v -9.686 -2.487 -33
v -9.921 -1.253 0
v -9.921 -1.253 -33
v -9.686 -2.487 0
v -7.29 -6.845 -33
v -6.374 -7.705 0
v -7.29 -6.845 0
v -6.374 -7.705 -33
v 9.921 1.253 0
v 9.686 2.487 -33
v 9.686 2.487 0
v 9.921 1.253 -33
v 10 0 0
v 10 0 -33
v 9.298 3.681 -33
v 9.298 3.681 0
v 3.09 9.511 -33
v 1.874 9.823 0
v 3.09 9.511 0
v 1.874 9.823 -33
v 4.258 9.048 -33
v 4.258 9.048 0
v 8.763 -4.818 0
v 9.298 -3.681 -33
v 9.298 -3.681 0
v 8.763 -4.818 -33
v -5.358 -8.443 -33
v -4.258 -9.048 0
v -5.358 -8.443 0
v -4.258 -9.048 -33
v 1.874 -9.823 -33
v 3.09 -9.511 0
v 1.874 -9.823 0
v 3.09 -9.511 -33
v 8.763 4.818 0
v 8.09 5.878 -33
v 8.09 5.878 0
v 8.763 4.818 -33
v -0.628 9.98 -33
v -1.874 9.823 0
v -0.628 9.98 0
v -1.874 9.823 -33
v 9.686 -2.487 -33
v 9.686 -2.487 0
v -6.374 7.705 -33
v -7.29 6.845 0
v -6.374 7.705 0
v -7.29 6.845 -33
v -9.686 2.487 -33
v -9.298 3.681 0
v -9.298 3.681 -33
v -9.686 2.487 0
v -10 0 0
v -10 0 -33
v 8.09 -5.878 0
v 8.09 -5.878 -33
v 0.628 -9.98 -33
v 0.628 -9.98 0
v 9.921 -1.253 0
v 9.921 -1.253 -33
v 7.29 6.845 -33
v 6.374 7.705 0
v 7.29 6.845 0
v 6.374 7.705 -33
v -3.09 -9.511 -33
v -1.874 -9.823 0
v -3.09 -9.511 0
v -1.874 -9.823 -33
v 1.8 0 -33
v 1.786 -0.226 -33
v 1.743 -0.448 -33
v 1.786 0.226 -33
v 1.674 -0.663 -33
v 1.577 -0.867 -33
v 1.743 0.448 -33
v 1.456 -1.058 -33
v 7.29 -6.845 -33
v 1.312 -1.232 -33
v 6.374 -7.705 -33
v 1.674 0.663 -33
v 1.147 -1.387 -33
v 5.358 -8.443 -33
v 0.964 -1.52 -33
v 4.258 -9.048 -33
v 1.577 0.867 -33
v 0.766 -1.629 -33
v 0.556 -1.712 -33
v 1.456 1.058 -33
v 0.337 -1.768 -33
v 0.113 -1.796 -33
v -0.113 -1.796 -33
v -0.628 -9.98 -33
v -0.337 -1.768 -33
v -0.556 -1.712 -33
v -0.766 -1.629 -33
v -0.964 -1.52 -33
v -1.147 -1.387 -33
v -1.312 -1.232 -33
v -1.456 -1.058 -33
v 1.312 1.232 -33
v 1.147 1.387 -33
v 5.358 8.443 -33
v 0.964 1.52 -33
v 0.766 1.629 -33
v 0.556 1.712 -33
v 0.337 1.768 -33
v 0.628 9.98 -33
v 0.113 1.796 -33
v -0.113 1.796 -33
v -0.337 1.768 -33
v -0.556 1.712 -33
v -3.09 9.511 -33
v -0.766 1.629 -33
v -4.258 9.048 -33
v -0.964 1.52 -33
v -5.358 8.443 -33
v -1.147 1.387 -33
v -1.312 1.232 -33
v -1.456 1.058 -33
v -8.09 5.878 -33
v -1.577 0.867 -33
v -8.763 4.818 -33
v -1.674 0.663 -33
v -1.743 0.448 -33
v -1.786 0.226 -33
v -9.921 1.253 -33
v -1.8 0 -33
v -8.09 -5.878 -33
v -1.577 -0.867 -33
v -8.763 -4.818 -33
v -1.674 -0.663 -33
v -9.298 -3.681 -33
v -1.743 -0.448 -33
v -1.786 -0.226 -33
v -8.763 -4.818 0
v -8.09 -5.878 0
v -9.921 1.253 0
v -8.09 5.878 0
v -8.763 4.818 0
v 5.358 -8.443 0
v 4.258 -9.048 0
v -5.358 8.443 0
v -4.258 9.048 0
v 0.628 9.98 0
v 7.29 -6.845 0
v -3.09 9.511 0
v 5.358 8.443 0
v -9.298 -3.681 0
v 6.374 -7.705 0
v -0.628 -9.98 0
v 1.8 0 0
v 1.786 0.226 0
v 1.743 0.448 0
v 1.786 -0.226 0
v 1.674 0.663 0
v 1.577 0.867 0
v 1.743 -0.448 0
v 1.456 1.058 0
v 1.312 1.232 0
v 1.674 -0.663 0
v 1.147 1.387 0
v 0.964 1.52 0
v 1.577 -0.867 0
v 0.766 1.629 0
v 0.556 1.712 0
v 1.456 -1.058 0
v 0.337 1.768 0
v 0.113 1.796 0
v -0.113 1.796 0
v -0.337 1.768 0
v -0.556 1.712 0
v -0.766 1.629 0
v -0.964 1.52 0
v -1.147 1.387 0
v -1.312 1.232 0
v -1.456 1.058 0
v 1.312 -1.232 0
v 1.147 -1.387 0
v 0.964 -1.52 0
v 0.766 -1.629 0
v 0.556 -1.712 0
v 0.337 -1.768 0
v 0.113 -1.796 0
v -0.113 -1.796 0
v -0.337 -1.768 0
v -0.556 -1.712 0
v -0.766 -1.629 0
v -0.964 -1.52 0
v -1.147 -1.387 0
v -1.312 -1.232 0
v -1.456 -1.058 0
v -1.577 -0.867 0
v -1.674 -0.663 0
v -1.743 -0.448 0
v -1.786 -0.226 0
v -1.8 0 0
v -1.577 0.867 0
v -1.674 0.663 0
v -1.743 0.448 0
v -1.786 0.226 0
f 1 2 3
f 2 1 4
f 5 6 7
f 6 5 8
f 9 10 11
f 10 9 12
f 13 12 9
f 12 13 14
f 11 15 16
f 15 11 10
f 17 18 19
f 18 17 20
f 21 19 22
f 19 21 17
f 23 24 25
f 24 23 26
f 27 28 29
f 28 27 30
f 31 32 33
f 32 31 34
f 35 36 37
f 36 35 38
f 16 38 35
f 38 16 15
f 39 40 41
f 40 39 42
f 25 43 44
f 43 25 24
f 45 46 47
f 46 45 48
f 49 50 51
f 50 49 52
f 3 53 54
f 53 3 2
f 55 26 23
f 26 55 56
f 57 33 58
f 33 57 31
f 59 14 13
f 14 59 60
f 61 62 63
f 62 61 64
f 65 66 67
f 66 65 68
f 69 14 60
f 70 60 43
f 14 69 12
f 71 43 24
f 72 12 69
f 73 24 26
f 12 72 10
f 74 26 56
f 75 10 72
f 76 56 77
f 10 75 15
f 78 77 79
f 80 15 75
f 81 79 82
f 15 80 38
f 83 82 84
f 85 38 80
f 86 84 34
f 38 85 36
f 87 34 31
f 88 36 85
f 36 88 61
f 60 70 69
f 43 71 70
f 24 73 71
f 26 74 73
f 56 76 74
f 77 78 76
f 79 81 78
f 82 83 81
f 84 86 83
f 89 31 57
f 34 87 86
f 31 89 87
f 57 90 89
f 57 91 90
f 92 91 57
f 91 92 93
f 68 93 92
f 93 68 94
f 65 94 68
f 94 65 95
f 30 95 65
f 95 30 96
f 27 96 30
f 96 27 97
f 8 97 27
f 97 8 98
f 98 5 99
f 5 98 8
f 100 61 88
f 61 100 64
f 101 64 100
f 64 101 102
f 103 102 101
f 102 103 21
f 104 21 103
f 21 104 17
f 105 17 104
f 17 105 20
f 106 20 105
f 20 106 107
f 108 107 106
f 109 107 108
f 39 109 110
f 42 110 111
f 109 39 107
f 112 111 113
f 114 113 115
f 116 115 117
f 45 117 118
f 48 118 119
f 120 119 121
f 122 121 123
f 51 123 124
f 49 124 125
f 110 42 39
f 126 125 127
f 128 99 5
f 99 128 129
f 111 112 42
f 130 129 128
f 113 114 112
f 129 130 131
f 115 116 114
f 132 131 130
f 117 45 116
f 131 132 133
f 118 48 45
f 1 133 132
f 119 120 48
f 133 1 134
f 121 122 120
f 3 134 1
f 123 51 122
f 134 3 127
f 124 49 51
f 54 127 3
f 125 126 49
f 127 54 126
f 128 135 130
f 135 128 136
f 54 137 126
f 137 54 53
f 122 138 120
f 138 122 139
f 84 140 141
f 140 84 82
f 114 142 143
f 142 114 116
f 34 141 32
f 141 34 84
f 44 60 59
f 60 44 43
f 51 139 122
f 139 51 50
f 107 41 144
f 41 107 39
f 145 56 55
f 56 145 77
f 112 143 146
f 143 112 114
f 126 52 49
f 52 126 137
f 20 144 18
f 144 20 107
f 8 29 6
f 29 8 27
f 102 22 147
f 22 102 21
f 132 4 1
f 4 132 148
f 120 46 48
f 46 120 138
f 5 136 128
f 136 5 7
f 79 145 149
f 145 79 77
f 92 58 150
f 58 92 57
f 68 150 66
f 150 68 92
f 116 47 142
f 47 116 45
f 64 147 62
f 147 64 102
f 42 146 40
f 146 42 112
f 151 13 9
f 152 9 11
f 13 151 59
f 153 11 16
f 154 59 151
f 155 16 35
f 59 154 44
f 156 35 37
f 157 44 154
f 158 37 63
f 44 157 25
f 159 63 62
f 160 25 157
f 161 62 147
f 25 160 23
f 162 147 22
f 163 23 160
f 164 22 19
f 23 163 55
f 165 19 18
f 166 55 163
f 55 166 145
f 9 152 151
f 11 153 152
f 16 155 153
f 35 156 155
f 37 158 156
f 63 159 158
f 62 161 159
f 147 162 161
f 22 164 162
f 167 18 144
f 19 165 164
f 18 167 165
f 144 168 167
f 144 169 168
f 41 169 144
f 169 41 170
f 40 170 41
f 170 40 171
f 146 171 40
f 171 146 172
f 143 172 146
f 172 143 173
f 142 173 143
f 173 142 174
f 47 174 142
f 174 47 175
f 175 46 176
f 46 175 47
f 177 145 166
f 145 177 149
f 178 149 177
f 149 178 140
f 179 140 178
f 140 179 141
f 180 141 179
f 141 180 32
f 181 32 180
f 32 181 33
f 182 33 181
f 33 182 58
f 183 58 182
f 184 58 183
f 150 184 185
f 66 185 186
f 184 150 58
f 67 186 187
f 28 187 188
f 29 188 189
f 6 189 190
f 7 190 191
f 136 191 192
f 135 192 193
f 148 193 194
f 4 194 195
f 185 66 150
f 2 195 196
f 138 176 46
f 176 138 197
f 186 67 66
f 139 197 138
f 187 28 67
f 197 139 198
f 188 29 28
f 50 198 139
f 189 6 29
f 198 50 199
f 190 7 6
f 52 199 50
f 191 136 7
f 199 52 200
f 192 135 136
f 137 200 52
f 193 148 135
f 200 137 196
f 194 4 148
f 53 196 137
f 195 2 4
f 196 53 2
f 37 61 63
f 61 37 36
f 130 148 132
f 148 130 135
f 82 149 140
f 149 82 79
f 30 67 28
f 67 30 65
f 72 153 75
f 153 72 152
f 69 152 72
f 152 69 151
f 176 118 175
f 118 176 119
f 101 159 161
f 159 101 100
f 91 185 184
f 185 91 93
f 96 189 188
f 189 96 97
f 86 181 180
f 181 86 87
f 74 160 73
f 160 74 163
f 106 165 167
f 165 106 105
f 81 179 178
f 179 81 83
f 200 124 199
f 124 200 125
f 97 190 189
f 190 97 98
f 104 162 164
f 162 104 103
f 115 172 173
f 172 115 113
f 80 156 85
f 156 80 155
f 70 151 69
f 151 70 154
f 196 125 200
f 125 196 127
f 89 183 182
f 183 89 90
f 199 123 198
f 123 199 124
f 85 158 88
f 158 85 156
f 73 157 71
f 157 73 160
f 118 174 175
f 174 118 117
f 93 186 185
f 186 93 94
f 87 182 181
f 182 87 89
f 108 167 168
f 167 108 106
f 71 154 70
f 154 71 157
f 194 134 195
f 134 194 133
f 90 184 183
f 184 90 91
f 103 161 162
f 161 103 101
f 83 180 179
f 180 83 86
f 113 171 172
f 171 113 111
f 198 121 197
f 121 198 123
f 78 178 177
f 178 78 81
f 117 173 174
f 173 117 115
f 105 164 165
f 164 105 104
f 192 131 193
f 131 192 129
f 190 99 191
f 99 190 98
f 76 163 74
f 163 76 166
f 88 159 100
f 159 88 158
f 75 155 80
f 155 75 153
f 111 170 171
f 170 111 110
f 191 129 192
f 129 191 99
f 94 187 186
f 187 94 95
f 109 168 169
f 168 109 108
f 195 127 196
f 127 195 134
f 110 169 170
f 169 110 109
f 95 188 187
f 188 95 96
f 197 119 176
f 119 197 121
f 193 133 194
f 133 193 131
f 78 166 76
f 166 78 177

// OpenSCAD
$fn = 50;


difference() {
	union() {
		translate(v = [0, 0, -33.0000000000]) {
			cylinder(h = 33, r = 10.0000000000);
		}
	}
	union() {
		#translate(v = [0, 0, -33]) {
			cylinder(h = 33, r = 1.8000000000);
		}
	}
}
